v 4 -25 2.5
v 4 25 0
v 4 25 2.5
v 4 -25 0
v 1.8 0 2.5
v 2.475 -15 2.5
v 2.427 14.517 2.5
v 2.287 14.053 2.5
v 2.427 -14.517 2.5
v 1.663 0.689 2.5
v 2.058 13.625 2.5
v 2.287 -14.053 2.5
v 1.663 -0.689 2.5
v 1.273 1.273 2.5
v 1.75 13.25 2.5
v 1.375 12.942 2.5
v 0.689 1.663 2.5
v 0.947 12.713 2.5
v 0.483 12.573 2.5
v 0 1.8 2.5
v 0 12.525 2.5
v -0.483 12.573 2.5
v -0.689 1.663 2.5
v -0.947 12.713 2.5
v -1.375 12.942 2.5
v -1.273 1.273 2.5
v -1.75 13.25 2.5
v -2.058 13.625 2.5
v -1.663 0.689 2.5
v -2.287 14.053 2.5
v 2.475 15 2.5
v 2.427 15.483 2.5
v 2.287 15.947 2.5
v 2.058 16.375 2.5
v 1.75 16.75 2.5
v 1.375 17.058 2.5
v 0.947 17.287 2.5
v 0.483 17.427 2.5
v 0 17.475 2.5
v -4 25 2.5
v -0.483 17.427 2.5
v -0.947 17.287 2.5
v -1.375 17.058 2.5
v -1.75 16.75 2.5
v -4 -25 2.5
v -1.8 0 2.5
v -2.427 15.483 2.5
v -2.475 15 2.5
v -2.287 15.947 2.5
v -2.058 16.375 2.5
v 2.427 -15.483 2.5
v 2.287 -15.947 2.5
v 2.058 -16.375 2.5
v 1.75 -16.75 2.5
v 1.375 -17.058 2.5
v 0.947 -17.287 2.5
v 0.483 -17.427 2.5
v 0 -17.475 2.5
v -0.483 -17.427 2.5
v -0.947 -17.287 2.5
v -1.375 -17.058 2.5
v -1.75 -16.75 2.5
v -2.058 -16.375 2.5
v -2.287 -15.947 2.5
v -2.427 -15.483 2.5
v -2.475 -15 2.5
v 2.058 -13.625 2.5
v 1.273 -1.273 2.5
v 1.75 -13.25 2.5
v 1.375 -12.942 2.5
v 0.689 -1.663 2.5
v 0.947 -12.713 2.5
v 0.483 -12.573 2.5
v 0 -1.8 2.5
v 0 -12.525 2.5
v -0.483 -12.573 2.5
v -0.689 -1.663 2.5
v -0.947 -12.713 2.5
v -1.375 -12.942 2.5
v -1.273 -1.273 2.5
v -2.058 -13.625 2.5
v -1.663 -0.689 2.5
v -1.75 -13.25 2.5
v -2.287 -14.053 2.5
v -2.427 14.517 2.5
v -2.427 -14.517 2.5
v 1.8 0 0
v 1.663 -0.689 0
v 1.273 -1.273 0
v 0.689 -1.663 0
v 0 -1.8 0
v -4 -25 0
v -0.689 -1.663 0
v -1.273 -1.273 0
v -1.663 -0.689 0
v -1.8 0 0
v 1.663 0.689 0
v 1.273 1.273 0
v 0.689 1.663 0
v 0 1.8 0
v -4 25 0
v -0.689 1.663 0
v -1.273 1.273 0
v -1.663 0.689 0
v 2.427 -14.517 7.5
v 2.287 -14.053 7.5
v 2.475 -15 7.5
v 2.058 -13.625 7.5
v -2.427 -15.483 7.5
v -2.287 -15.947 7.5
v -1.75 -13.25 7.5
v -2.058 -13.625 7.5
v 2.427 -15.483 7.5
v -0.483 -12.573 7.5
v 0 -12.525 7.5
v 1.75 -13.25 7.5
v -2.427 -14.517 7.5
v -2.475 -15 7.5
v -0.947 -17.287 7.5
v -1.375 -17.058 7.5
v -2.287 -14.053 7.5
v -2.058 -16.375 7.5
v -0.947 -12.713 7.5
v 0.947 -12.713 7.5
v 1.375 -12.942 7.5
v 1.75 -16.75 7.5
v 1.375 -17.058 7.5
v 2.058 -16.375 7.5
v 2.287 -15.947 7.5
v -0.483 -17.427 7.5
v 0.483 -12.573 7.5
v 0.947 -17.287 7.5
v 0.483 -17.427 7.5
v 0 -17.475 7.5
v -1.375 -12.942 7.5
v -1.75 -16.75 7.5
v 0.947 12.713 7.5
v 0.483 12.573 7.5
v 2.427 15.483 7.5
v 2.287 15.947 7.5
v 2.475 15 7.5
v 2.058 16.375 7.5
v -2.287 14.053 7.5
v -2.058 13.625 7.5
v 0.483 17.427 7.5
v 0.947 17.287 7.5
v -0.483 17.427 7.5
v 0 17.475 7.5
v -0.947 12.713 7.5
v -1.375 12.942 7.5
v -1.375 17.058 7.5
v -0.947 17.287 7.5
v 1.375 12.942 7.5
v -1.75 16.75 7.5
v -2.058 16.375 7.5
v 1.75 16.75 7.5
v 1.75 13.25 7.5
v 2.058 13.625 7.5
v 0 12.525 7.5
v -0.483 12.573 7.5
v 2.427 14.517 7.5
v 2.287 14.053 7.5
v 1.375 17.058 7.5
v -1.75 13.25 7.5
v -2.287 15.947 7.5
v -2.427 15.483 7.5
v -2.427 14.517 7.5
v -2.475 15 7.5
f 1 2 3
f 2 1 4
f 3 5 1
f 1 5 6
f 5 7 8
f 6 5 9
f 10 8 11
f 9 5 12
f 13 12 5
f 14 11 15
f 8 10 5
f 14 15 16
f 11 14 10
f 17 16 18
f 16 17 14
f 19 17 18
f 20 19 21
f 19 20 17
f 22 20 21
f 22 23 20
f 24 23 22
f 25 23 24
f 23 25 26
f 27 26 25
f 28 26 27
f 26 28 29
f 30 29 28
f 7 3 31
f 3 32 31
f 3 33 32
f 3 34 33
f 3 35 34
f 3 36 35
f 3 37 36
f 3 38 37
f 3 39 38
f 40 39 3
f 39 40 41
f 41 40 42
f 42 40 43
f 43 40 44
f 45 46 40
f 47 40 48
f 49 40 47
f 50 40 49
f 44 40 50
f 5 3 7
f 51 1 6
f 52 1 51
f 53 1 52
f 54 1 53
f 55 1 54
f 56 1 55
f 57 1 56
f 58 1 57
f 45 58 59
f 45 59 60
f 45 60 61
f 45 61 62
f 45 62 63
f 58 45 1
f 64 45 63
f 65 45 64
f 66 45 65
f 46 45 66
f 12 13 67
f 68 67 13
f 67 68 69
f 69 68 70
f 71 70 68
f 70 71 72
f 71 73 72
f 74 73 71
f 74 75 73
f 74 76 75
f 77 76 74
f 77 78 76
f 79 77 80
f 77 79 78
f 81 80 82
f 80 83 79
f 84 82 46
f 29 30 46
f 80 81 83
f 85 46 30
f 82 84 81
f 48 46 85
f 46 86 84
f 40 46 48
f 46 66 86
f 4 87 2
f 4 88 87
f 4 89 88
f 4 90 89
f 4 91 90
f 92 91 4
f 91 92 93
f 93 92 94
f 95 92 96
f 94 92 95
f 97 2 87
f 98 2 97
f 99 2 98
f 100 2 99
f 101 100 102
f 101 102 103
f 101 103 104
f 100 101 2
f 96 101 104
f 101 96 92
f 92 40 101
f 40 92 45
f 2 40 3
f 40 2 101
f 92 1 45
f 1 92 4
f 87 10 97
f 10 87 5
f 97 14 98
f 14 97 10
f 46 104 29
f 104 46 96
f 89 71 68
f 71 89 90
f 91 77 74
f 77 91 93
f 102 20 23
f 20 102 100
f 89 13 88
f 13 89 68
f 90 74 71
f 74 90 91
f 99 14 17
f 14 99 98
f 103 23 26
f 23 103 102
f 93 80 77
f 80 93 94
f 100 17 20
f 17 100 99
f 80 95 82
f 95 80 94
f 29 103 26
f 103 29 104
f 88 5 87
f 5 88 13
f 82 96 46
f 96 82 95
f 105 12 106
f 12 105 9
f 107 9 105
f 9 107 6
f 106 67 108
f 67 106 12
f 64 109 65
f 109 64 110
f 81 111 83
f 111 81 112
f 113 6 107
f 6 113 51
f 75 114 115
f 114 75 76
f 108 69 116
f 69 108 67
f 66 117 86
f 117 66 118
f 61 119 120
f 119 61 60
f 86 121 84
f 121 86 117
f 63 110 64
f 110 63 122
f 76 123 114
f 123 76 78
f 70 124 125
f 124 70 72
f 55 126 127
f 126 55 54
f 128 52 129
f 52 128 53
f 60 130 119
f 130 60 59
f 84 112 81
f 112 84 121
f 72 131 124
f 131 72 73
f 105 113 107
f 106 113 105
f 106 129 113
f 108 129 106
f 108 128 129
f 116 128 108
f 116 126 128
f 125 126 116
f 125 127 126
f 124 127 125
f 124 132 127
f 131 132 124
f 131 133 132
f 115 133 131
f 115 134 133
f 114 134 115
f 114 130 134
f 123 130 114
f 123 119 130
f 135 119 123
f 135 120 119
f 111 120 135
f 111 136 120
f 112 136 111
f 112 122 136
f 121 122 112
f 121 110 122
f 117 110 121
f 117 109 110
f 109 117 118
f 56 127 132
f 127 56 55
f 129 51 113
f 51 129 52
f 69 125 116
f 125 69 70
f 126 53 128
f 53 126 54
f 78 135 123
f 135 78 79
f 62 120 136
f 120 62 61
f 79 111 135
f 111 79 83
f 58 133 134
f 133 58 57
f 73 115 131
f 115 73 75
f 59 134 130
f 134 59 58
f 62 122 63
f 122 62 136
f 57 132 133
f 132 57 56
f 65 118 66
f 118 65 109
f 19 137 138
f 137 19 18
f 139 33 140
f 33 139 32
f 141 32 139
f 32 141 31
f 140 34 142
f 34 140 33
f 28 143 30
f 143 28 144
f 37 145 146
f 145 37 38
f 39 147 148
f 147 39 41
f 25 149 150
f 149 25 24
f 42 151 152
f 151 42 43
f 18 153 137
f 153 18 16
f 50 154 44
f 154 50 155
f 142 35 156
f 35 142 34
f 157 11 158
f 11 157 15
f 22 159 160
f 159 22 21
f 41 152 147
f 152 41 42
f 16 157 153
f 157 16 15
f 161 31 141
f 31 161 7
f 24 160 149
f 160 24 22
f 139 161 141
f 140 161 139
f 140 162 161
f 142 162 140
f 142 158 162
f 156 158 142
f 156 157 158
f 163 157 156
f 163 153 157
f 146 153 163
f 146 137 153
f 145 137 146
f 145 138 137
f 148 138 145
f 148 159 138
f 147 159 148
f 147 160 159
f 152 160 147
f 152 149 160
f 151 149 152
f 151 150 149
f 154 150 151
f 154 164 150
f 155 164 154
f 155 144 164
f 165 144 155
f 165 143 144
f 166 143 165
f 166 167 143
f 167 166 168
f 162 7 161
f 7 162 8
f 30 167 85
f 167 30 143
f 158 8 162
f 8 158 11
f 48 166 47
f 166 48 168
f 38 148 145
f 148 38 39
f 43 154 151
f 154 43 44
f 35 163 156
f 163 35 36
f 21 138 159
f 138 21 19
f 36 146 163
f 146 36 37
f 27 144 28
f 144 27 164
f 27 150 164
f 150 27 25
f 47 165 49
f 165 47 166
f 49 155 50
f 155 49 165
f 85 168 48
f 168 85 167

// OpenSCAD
overlap=0.1;

difference()
{
	translate([-4,-25,0]) cube([8,50,2.5]);
	translate([0,0,-overlap]) cylinder(r=1.8,h=2.5+2*overlap,$fn=16);
}
translate([0,-15,2.5-overlap]) cylinder(r=4.95/2,h=5+overlap,$fn=32);
translate([0,15,2.5-overlap]) cylinder(r=4.95/2,h=5+overlap,$fn=32);
//translate([0,0,2.5-overlap]) cylinder(r=5.25/2,h=5+overlap,$fn=32);
